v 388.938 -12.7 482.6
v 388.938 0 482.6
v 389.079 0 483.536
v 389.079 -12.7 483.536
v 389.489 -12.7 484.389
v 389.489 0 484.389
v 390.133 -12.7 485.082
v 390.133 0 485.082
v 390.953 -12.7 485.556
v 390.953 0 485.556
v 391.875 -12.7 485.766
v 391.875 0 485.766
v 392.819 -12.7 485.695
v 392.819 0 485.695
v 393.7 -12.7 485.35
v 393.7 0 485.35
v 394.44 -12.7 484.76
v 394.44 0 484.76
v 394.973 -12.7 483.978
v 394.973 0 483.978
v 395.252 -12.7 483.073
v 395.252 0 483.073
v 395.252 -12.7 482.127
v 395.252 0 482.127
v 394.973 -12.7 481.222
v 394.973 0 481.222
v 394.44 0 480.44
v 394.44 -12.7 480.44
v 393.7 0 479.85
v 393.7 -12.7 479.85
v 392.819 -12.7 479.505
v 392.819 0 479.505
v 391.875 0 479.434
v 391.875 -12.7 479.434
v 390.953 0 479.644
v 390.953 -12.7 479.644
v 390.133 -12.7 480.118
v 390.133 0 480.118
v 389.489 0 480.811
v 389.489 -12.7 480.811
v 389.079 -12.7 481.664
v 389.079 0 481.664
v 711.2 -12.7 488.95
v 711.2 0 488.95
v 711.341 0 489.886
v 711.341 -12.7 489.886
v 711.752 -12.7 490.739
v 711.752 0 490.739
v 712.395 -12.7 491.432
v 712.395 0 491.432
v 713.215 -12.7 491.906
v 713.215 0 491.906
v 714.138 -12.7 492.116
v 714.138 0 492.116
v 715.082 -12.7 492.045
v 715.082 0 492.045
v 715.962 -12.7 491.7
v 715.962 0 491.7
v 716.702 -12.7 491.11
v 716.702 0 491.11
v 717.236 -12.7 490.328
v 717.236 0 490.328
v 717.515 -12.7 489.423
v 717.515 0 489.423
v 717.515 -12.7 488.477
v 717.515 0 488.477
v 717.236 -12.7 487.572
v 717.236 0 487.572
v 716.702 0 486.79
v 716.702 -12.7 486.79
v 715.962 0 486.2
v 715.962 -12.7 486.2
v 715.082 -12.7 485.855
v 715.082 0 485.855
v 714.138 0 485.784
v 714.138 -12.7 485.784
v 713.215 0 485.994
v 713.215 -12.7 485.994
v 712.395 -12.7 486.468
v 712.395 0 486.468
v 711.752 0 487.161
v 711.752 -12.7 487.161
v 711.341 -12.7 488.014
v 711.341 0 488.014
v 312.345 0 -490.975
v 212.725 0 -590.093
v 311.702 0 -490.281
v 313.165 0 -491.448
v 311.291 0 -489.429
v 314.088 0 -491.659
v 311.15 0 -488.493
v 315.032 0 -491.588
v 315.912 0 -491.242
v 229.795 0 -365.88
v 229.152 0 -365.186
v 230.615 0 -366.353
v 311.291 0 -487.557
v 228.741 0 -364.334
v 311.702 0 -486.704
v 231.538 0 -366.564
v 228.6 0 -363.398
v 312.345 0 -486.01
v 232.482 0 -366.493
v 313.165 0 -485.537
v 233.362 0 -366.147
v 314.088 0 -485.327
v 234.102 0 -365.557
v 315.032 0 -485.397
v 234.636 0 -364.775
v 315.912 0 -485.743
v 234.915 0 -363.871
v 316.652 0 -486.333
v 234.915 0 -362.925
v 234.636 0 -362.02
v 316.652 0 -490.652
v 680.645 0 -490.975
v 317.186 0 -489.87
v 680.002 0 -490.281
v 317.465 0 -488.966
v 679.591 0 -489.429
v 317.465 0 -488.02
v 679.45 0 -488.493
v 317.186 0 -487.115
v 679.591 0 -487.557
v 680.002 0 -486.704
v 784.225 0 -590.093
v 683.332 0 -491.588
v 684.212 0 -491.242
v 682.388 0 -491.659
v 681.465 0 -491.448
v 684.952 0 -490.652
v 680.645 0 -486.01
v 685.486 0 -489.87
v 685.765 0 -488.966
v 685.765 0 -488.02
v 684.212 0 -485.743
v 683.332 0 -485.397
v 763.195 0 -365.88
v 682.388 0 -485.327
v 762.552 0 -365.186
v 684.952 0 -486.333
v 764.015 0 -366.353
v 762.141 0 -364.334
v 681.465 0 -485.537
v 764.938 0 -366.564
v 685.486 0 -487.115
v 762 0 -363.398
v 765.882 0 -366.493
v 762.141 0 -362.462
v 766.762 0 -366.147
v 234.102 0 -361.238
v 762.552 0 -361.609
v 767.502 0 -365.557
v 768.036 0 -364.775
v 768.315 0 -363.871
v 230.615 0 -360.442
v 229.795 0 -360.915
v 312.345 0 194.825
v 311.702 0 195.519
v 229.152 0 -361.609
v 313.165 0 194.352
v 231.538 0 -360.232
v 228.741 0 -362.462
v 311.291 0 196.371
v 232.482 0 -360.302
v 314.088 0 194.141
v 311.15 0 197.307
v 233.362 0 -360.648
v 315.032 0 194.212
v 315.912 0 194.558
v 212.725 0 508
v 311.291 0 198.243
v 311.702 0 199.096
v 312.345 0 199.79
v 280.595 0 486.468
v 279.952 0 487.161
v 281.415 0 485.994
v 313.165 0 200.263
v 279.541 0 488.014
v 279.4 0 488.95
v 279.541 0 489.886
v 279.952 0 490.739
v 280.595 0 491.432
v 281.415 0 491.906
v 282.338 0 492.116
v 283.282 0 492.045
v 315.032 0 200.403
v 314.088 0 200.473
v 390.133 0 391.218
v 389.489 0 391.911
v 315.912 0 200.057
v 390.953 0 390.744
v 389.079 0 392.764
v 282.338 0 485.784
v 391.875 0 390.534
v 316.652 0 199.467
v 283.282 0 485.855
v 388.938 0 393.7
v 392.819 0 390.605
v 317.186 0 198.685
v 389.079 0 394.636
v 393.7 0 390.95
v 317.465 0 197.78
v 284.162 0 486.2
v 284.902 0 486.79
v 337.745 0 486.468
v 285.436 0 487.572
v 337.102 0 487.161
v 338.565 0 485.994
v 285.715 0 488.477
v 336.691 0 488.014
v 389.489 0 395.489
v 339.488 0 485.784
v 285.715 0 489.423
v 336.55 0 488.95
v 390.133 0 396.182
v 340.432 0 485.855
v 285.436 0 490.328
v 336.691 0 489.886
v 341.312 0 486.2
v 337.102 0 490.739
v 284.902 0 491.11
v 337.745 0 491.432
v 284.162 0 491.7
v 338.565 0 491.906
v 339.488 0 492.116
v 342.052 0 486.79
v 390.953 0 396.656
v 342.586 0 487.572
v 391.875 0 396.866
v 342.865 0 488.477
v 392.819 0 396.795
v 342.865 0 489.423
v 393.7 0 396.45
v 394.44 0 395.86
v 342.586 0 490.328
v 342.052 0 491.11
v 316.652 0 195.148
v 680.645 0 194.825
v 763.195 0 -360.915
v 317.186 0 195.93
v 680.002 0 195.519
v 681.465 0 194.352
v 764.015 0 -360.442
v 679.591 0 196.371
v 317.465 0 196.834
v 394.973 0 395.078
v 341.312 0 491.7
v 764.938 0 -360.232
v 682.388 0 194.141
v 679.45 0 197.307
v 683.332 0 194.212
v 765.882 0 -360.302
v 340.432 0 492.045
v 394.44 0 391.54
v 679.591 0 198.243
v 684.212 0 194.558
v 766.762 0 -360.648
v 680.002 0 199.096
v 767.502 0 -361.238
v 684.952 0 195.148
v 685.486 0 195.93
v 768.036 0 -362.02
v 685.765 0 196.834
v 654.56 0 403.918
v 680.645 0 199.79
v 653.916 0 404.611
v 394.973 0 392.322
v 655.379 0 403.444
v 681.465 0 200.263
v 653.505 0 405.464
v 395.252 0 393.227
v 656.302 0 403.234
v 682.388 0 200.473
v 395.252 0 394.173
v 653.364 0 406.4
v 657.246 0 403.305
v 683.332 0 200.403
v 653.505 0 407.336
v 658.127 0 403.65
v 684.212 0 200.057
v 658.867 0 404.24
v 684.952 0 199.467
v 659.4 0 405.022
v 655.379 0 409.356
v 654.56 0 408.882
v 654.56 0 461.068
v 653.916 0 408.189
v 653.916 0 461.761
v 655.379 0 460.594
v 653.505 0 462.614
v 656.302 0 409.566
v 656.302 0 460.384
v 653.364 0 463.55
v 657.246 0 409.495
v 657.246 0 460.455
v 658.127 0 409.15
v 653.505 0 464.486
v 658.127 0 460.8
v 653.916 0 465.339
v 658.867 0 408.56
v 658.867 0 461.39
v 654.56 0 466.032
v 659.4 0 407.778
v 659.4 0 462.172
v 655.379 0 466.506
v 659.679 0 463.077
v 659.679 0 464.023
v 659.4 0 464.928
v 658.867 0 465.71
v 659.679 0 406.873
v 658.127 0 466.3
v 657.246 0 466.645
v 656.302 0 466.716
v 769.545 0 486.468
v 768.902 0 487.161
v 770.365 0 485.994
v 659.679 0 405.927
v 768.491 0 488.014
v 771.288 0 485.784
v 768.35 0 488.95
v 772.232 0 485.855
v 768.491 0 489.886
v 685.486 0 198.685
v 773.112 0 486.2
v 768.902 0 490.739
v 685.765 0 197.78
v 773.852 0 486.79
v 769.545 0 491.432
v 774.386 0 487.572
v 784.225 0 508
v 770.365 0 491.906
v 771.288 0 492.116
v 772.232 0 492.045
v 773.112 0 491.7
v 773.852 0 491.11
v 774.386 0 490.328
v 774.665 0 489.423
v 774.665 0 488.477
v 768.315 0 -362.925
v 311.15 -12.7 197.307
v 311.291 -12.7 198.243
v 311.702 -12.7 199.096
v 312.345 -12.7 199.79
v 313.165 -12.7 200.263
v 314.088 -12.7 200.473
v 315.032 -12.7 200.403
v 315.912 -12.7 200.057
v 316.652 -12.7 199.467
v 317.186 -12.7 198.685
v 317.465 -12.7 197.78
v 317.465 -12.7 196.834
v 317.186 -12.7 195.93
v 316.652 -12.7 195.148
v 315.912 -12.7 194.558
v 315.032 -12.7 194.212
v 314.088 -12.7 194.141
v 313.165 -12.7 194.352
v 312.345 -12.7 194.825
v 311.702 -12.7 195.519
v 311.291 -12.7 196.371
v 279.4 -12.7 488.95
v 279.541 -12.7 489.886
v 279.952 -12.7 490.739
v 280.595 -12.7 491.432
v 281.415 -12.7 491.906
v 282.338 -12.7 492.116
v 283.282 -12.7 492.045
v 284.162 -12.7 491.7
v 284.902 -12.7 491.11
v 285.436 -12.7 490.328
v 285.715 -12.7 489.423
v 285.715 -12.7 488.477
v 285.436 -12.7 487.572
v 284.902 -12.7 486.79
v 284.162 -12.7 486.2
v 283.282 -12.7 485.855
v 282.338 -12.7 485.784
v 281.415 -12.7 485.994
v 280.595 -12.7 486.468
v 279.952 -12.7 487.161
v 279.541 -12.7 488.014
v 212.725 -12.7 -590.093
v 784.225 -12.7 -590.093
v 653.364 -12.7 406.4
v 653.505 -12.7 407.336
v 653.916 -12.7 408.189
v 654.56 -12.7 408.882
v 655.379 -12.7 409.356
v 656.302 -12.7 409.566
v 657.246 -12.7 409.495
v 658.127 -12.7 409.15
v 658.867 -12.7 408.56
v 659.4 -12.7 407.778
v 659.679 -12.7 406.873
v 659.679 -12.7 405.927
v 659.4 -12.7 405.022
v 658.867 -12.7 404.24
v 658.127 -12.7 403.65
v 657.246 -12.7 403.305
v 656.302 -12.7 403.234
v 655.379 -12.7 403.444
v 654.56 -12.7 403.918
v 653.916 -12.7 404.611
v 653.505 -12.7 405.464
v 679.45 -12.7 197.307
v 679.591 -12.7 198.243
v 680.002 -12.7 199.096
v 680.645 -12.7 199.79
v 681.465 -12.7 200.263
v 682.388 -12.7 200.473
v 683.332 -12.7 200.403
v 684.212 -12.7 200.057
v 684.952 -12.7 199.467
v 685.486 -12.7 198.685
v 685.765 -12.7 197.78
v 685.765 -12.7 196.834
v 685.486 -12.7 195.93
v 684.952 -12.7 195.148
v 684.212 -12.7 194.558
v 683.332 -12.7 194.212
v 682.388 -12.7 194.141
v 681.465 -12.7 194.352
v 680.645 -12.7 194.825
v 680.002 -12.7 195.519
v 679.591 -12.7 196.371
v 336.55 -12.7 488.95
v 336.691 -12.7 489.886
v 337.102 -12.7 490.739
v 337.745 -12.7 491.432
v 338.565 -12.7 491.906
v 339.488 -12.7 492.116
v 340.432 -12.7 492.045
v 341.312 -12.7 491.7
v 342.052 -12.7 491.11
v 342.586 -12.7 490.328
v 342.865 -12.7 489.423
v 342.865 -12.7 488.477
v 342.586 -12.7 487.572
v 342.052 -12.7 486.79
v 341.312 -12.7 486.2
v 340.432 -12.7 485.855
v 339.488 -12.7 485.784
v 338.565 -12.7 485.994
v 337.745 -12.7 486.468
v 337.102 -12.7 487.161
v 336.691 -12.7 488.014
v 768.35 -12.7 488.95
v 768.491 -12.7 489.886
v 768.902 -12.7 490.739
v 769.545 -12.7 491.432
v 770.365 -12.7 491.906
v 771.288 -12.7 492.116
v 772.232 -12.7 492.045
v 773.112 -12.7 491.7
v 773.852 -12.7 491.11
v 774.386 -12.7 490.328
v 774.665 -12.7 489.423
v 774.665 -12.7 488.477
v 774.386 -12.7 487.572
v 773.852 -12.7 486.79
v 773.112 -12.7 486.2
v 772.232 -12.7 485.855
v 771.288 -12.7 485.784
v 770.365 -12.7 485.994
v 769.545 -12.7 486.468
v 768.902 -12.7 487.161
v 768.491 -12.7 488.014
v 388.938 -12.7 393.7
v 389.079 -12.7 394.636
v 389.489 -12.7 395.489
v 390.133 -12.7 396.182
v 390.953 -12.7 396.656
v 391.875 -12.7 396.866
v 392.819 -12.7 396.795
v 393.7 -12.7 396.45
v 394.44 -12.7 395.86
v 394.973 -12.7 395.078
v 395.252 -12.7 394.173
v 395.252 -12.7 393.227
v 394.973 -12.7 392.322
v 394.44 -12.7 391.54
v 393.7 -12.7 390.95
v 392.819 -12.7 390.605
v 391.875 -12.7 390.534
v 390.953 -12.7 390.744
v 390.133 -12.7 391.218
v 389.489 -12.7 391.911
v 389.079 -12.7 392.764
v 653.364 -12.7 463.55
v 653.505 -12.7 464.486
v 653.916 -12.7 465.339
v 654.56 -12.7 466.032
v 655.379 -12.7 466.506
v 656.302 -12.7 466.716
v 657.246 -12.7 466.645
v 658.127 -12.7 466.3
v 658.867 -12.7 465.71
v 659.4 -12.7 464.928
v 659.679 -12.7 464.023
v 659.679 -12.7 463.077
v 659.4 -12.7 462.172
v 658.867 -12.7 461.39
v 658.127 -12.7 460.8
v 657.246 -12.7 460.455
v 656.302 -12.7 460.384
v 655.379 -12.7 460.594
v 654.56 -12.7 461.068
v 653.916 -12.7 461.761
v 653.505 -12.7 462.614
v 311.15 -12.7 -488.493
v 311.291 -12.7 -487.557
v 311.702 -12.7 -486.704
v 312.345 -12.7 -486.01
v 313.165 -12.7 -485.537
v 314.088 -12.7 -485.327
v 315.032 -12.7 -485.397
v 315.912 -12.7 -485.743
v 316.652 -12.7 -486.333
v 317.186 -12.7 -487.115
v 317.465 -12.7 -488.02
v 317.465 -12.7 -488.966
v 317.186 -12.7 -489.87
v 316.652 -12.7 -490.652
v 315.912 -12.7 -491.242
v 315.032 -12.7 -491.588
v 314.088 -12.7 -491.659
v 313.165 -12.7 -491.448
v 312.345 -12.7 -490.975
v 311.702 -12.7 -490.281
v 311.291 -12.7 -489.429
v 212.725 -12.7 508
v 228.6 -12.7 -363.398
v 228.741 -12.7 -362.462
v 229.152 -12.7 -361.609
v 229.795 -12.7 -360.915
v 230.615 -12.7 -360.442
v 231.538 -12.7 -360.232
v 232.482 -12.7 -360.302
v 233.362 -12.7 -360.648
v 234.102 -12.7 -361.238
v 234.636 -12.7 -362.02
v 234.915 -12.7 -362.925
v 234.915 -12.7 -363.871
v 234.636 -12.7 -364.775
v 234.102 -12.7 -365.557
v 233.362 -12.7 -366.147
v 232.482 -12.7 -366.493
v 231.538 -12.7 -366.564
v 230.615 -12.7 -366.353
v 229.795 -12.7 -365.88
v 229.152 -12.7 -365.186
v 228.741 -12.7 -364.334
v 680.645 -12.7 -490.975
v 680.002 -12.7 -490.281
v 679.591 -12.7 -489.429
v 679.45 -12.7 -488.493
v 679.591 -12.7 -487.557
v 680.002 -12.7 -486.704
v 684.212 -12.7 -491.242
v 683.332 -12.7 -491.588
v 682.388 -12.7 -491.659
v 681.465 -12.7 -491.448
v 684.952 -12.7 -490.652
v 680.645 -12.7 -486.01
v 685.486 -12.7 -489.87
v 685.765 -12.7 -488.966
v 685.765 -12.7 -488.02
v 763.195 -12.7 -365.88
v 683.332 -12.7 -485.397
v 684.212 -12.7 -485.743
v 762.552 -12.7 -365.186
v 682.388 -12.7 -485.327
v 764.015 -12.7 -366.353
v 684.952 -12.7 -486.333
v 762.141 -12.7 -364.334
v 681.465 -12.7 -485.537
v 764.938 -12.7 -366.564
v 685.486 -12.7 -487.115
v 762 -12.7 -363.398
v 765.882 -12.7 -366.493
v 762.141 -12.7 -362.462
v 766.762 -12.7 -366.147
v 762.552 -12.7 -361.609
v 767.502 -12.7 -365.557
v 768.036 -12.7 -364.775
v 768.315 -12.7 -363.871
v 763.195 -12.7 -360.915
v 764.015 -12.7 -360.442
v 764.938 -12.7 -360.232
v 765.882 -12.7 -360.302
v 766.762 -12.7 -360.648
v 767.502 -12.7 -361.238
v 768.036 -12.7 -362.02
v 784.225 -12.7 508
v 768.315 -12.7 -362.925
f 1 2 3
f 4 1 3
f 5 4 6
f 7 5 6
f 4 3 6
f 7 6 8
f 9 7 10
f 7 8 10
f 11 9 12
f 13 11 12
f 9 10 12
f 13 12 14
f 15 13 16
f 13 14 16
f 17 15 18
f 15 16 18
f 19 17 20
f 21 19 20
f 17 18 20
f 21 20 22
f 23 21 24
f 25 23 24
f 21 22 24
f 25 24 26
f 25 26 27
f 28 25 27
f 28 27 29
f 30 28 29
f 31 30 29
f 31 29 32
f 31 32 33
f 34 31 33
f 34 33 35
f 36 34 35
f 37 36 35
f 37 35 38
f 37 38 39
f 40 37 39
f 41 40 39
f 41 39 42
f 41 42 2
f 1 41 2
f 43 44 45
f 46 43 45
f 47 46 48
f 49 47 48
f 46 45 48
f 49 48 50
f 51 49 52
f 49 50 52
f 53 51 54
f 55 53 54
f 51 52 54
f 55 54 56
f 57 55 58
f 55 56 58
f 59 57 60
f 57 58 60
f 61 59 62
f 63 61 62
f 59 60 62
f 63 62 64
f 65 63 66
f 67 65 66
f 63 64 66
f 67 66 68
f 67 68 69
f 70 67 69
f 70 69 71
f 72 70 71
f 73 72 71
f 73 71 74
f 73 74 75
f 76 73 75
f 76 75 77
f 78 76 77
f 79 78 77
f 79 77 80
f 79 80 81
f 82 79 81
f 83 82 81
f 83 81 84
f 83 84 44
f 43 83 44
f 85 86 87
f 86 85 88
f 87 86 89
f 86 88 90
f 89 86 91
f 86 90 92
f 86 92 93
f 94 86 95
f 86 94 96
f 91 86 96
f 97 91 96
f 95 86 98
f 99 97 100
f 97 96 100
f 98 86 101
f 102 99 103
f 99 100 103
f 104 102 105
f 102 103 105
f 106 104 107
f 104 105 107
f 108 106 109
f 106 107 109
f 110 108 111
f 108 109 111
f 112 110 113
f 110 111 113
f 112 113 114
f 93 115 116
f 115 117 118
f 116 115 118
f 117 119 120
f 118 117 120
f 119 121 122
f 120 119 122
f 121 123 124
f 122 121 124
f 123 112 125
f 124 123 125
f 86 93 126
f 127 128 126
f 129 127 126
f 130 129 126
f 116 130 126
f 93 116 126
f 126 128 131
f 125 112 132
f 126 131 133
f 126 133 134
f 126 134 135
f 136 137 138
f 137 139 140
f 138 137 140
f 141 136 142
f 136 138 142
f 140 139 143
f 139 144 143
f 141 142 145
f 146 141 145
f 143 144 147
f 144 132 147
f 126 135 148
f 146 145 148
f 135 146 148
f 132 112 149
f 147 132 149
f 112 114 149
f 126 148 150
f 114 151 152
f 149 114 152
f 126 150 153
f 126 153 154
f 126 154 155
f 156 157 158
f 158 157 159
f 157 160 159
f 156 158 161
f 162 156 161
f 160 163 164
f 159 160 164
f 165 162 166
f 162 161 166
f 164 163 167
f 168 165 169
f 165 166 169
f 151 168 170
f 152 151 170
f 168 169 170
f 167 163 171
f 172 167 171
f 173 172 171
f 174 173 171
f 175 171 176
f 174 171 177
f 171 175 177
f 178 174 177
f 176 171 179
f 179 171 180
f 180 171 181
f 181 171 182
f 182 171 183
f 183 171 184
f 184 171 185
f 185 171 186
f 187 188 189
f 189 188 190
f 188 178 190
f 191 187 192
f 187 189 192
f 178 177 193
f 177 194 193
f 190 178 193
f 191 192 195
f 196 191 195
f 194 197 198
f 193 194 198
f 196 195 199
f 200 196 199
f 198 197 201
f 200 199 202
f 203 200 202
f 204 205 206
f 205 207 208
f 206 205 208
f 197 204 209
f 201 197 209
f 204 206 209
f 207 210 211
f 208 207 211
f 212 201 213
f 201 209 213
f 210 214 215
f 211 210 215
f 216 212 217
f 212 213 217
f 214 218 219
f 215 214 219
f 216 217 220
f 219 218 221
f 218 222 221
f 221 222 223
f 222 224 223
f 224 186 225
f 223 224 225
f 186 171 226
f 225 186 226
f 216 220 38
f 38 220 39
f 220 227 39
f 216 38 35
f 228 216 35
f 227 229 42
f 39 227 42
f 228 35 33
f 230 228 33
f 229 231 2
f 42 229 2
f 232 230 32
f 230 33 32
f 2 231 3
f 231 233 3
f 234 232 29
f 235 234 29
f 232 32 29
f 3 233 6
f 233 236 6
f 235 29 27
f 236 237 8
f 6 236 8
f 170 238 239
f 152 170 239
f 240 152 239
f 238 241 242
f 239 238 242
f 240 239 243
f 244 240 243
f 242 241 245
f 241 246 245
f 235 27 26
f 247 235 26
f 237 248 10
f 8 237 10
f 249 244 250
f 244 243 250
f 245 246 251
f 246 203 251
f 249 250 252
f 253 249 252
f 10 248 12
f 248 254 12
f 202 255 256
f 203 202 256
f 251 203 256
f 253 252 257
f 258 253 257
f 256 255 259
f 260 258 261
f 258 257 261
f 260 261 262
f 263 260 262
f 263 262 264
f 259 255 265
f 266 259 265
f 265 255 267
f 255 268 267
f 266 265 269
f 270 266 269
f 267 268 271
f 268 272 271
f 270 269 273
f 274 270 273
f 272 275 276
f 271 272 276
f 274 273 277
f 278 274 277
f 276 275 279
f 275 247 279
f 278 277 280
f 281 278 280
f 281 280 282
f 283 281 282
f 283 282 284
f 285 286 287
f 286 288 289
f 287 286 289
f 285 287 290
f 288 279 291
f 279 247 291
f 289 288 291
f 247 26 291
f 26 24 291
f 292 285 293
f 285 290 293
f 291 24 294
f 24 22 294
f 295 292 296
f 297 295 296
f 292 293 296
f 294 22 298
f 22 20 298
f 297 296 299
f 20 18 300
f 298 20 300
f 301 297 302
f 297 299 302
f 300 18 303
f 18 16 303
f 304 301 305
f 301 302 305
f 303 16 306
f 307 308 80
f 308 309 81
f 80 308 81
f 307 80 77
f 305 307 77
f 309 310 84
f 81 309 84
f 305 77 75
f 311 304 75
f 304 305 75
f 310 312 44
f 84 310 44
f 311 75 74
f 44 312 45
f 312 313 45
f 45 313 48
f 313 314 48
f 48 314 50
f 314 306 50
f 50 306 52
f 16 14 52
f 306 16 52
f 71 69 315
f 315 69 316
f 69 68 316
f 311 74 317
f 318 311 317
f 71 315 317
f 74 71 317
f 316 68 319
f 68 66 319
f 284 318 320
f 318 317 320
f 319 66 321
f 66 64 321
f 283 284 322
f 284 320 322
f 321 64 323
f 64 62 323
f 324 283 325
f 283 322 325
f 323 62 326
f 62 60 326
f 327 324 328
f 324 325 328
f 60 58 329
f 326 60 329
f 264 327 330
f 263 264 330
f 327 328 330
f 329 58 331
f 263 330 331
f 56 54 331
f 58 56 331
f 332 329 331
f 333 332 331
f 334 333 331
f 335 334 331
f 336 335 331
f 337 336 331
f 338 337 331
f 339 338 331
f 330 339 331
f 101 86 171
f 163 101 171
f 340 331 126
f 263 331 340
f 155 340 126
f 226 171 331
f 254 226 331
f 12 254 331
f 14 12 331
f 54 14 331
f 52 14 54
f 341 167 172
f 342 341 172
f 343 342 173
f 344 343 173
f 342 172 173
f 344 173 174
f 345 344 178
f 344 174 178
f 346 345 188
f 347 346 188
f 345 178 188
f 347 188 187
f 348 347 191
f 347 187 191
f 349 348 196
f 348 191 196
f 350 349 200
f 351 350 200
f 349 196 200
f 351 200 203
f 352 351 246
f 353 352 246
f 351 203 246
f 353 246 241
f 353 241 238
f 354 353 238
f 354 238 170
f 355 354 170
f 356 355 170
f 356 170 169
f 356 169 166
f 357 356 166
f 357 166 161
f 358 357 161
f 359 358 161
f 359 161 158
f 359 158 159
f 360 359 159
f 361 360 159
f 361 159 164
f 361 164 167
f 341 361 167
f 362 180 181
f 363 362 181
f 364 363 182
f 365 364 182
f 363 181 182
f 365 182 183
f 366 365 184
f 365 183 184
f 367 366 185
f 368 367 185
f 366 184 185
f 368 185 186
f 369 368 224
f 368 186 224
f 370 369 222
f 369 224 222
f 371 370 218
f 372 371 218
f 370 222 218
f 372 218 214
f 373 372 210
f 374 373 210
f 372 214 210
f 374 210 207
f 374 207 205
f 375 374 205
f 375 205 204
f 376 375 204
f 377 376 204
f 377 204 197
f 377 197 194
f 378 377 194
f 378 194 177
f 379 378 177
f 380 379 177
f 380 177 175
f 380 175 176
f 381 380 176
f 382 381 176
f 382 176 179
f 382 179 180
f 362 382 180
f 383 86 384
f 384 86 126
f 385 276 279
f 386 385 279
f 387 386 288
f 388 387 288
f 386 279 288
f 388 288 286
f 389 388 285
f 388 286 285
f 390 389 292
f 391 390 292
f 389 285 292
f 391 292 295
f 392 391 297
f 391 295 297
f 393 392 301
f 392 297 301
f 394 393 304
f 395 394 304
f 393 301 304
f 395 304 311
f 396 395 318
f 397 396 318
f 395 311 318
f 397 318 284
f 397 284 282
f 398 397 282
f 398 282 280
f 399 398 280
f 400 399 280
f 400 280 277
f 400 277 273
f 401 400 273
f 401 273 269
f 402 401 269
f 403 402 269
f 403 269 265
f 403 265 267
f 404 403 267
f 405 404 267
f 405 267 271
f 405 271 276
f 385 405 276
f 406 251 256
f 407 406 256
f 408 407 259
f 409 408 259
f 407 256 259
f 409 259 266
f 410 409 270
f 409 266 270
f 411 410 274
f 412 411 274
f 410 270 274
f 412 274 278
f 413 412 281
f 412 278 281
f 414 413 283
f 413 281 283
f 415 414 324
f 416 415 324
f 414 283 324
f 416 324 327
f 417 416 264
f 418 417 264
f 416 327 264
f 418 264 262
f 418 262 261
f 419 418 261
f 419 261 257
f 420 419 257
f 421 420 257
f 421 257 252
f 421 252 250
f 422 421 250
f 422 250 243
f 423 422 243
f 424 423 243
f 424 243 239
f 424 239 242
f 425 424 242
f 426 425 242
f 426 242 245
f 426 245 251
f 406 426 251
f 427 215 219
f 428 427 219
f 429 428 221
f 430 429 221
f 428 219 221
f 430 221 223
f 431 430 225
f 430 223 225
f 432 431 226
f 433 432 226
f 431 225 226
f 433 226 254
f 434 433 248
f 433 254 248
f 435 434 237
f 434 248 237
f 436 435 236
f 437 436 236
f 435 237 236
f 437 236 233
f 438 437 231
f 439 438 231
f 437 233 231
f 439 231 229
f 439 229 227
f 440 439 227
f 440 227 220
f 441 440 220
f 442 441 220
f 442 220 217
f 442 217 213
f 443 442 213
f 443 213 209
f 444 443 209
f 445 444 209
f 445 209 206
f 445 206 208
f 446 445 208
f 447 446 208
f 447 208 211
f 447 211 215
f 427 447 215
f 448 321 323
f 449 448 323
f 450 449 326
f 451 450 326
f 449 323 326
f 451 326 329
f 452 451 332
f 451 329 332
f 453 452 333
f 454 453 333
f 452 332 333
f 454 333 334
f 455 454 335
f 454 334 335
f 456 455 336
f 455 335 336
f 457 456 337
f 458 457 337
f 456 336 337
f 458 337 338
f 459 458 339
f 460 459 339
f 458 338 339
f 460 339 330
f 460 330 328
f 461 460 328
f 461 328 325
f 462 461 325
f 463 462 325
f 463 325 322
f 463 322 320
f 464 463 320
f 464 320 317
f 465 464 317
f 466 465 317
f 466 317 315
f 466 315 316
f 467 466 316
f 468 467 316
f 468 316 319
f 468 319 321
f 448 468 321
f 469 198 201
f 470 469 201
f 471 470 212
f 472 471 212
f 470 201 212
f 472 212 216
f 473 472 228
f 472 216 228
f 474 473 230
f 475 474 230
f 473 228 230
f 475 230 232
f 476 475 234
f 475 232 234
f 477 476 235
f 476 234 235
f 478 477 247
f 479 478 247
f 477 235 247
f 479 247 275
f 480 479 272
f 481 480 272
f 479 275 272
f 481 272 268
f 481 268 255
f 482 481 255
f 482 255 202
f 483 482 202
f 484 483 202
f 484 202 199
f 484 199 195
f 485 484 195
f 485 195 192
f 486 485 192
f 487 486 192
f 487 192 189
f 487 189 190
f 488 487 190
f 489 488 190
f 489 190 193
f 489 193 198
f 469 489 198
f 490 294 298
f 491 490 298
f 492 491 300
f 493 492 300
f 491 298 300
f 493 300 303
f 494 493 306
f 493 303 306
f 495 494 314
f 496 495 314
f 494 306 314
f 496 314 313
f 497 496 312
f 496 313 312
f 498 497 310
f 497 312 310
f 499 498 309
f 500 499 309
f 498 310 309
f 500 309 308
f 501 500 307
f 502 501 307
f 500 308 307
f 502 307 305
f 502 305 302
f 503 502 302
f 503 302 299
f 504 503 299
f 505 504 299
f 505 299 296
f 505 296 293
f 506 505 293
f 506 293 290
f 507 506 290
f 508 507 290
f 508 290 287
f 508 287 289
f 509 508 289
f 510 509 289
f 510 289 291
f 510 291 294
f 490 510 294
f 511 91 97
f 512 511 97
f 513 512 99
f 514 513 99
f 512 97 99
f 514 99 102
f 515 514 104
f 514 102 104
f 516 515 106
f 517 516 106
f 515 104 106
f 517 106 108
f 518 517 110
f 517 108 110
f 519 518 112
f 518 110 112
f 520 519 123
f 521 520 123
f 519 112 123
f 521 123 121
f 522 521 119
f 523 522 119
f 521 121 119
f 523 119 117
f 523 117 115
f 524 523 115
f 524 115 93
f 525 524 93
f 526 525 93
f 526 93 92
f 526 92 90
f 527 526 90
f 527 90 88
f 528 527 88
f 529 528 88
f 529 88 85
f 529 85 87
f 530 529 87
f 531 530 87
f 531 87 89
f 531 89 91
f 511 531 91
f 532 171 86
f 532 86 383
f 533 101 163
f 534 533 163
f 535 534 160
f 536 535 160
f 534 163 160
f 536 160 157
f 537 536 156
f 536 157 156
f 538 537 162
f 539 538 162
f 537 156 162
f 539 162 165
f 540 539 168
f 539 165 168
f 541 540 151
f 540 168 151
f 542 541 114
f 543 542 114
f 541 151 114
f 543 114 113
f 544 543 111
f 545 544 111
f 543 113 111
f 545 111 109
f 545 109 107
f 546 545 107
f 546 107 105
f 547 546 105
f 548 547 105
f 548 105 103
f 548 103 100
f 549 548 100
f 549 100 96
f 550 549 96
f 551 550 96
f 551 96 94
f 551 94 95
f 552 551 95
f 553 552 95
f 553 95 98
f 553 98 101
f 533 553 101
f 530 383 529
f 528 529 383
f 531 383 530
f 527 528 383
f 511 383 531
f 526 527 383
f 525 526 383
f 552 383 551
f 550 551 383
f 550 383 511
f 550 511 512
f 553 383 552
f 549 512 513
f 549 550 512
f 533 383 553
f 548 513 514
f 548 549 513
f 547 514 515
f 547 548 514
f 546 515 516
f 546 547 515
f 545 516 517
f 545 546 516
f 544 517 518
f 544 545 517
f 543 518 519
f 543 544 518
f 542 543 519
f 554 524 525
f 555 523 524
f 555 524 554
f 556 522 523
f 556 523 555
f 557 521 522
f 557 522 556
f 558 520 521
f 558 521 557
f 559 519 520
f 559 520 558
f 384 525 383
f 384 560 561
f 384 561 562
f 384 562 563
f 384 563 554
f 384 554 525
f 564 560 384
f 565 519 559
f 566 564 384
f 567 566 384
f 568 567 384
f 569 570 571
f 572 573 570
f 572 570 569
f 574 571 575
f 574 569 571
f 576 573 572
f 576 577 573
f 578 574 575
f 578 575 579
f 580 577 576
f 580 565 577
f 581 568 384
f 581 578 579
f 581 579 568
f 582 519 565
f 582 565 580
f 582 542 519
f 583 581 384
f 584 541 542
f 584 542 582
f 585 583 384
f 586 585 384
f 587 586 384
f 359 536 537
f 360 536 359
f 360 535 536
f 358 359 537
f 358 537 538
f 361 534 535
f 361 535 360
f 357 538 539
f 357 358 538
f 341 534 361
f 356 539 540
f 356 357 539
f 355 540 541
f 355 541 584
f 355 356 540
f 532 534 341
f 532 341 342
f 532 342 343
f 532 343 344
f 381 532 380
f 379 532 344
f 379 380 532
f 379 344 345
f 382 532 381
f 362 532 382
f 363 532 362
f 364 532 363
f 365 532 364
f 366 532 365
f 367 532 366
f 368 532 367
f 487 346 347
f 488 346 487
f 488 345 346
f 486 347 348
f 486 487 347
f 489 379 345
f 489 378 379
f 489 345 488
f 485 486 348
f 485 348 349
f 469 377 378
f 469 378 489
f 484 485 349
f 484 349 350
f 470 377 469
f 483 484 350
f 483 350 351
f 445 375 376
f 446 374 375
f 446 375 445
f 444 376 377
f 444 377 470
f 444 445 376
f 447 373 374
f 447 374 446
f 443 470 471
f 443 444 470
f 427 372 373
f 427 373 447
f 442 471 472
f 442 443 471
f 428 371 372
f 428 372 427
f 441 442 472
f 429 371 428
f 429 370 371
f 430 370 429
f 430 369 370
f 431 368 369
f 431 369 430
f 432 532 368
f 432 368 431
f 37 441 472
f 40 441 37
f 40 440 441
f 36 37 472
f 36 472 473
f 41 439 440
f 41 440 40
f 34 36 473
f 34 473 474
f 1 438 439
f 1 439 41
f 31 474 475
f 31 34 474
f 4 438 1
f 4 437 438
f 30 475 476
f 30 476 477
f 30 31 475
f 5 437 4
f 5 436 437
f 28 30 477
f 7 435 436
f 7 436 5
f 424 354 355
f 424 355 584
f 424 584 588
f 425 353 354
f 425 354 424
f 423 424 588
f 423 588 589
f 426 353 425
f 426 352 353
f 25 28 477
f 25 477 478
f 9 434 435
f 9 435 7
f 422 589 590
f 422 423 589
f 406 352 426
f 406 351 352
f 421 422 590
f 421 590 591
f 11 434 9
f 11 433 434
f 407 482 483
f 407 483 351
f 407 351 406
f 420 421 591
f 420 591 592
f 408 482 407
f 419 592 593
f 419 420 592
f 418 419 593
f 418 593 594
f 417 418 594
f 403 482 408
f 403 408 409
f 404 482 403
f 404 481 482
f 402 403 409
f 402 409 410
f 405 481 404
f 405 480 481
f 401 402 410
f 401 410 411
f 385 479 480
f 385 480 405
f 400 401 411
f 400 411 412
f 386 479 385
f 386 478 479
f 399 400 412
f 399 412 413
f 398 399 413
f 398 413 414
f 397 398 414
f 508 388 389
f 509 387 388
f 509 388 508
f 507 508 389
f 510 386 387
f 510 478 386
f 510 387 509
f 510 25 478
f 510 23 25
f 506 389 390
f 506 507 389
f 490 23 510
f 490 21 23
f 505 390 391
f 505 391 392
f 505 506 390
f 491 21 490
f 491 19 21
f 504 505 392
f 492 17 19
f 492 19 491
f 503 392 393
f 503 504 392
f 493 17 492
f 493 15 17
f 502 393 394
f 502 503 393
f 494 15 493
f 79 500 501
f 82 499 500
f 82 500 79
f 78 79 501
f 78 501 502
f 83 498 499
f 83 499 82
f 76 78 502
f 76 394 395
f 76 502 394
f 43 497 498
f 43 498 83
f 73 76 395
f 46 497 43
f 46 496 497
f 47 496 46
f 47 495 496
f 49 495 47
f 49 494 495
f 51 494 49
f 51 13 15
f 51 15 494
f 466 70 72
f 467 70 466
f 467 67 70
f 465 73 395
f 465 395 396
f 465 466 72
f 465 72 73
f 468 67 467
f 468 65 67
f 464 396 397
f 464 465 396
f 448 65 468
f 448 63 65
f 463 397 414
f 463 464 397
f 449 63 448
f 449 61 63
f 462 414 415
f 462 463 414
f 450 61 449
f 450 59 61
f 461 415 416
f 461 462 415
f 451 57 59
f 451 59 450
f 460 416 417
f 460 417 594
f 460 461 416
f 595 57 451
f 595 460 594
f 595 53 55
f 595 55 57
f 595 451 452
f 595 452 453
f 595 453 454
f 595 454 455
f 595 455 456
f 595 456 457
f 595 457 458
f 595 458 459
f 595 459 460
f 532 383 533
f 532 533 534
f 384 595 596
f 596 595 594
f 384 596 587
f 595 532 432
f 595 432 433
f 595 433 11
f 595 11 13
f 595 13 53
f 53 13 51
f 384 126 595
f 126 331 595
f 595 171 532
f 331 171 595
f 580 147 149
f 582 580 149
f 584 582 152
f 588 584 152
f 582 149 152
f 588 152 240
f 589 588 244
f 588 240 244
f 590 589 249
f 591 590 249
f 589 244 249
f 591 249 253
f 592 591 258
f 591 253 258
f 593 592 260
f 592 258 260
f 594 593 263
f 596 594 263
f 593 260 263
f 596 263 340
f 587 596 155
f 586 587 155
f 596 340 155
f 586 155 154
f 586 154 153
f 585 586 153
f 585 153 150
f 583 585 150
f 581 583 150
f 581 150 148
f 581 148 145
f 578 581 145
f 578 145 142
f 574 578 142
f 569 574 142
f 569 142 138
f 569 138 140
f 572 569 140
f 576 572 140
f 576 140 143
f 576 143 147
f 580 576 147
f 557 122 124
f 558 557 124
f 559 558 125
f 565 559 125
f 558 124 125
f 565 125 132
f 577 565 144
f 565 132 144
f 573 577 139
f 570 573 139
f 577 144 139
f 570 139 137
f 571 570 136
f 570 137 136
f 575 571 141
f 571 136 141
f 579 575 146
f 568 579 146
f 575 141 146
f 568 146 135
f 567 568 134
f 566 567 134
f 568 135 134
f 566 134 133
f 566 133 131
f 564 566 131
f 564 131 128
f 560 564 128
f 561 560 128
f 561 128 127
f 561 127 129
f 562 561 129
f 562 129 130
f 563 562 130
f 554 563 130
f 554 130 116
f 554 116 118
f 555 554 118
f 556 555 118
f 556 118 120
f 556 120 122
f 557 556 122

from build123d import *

# Parameters (mm, degrees)
F0_W     = 784.225
F0_H     = 508
F1_DEPTH = 12.7
F3_D     = 6.35
F5_D     = 6.35
F6_DEPTH = 212.725
F8_D     = 6.35
F9_DEPTH = 590.0928
F11_D    = 6.35
F13_D    = 6.35


with BuildPart() as f1:
    # F0 (on Front) → F1 (new body)
    with BuildSketch(Plane.XZ):
        with Locations((392.1125, 254)):
            Rectangle(F0_W, F0_H)
    extrude(amount=F1_DEPTH)

    # F3 (through all)
    with Locations(Plane.XZ.offset(12.7)):
        with Locations((392.1125, 482.6), (392.1125, 393.7)):
            Hole(F3_D / 2)

    # F5 (through all)
    with Locations(Plane.XZ.offset(12.7)):
        with Locations((771.525, 488.95), (714.375, 488.95), (339.725, 488.95), (282.575, 488.95)):
            Hole(F5_D / 2)

    # F6 (cut): a face of the model
    f6_faces = [f1.faces().sort_by_distance(p)[0] for p in [
        (0, -6.35, 254),
    ]]
    extrude(f6_faces, amount=-F6_DEPTH, mode=Mode.SUBTRACT)

    # F8 (through all)
    with Locations(Plane.XZ.offset(12.7)):
        with Locations((656.5392, 463.55), (656.5392, 406.4)):
            Hole(F8_D / 2)

    # F9 (add): a face of the model
    f9_faces = [f1.faces().sort_by_distance(p)[0] for p in [
        (498.475, -6.35, 0),
    ]]
    extrude(f9_faces, amount=F9_DEPTH)

    # F11 (through all)
    with Locations(Plane.XZ.offset(12.7)):
        with Locations((231.775, -363.3978), (765.175, -363.3978)):
            Hole(F11_D / 2)

    # F13 (through all)
    with Locations(Plane.XZ.offset(12.7)):
        with Locations((682.625, 197.3072), (314.325, 197.3072), (314.325, -488.4928), (682.625, -488.4928)):
            Hole(F13_D / 2)


solid = f1.part
